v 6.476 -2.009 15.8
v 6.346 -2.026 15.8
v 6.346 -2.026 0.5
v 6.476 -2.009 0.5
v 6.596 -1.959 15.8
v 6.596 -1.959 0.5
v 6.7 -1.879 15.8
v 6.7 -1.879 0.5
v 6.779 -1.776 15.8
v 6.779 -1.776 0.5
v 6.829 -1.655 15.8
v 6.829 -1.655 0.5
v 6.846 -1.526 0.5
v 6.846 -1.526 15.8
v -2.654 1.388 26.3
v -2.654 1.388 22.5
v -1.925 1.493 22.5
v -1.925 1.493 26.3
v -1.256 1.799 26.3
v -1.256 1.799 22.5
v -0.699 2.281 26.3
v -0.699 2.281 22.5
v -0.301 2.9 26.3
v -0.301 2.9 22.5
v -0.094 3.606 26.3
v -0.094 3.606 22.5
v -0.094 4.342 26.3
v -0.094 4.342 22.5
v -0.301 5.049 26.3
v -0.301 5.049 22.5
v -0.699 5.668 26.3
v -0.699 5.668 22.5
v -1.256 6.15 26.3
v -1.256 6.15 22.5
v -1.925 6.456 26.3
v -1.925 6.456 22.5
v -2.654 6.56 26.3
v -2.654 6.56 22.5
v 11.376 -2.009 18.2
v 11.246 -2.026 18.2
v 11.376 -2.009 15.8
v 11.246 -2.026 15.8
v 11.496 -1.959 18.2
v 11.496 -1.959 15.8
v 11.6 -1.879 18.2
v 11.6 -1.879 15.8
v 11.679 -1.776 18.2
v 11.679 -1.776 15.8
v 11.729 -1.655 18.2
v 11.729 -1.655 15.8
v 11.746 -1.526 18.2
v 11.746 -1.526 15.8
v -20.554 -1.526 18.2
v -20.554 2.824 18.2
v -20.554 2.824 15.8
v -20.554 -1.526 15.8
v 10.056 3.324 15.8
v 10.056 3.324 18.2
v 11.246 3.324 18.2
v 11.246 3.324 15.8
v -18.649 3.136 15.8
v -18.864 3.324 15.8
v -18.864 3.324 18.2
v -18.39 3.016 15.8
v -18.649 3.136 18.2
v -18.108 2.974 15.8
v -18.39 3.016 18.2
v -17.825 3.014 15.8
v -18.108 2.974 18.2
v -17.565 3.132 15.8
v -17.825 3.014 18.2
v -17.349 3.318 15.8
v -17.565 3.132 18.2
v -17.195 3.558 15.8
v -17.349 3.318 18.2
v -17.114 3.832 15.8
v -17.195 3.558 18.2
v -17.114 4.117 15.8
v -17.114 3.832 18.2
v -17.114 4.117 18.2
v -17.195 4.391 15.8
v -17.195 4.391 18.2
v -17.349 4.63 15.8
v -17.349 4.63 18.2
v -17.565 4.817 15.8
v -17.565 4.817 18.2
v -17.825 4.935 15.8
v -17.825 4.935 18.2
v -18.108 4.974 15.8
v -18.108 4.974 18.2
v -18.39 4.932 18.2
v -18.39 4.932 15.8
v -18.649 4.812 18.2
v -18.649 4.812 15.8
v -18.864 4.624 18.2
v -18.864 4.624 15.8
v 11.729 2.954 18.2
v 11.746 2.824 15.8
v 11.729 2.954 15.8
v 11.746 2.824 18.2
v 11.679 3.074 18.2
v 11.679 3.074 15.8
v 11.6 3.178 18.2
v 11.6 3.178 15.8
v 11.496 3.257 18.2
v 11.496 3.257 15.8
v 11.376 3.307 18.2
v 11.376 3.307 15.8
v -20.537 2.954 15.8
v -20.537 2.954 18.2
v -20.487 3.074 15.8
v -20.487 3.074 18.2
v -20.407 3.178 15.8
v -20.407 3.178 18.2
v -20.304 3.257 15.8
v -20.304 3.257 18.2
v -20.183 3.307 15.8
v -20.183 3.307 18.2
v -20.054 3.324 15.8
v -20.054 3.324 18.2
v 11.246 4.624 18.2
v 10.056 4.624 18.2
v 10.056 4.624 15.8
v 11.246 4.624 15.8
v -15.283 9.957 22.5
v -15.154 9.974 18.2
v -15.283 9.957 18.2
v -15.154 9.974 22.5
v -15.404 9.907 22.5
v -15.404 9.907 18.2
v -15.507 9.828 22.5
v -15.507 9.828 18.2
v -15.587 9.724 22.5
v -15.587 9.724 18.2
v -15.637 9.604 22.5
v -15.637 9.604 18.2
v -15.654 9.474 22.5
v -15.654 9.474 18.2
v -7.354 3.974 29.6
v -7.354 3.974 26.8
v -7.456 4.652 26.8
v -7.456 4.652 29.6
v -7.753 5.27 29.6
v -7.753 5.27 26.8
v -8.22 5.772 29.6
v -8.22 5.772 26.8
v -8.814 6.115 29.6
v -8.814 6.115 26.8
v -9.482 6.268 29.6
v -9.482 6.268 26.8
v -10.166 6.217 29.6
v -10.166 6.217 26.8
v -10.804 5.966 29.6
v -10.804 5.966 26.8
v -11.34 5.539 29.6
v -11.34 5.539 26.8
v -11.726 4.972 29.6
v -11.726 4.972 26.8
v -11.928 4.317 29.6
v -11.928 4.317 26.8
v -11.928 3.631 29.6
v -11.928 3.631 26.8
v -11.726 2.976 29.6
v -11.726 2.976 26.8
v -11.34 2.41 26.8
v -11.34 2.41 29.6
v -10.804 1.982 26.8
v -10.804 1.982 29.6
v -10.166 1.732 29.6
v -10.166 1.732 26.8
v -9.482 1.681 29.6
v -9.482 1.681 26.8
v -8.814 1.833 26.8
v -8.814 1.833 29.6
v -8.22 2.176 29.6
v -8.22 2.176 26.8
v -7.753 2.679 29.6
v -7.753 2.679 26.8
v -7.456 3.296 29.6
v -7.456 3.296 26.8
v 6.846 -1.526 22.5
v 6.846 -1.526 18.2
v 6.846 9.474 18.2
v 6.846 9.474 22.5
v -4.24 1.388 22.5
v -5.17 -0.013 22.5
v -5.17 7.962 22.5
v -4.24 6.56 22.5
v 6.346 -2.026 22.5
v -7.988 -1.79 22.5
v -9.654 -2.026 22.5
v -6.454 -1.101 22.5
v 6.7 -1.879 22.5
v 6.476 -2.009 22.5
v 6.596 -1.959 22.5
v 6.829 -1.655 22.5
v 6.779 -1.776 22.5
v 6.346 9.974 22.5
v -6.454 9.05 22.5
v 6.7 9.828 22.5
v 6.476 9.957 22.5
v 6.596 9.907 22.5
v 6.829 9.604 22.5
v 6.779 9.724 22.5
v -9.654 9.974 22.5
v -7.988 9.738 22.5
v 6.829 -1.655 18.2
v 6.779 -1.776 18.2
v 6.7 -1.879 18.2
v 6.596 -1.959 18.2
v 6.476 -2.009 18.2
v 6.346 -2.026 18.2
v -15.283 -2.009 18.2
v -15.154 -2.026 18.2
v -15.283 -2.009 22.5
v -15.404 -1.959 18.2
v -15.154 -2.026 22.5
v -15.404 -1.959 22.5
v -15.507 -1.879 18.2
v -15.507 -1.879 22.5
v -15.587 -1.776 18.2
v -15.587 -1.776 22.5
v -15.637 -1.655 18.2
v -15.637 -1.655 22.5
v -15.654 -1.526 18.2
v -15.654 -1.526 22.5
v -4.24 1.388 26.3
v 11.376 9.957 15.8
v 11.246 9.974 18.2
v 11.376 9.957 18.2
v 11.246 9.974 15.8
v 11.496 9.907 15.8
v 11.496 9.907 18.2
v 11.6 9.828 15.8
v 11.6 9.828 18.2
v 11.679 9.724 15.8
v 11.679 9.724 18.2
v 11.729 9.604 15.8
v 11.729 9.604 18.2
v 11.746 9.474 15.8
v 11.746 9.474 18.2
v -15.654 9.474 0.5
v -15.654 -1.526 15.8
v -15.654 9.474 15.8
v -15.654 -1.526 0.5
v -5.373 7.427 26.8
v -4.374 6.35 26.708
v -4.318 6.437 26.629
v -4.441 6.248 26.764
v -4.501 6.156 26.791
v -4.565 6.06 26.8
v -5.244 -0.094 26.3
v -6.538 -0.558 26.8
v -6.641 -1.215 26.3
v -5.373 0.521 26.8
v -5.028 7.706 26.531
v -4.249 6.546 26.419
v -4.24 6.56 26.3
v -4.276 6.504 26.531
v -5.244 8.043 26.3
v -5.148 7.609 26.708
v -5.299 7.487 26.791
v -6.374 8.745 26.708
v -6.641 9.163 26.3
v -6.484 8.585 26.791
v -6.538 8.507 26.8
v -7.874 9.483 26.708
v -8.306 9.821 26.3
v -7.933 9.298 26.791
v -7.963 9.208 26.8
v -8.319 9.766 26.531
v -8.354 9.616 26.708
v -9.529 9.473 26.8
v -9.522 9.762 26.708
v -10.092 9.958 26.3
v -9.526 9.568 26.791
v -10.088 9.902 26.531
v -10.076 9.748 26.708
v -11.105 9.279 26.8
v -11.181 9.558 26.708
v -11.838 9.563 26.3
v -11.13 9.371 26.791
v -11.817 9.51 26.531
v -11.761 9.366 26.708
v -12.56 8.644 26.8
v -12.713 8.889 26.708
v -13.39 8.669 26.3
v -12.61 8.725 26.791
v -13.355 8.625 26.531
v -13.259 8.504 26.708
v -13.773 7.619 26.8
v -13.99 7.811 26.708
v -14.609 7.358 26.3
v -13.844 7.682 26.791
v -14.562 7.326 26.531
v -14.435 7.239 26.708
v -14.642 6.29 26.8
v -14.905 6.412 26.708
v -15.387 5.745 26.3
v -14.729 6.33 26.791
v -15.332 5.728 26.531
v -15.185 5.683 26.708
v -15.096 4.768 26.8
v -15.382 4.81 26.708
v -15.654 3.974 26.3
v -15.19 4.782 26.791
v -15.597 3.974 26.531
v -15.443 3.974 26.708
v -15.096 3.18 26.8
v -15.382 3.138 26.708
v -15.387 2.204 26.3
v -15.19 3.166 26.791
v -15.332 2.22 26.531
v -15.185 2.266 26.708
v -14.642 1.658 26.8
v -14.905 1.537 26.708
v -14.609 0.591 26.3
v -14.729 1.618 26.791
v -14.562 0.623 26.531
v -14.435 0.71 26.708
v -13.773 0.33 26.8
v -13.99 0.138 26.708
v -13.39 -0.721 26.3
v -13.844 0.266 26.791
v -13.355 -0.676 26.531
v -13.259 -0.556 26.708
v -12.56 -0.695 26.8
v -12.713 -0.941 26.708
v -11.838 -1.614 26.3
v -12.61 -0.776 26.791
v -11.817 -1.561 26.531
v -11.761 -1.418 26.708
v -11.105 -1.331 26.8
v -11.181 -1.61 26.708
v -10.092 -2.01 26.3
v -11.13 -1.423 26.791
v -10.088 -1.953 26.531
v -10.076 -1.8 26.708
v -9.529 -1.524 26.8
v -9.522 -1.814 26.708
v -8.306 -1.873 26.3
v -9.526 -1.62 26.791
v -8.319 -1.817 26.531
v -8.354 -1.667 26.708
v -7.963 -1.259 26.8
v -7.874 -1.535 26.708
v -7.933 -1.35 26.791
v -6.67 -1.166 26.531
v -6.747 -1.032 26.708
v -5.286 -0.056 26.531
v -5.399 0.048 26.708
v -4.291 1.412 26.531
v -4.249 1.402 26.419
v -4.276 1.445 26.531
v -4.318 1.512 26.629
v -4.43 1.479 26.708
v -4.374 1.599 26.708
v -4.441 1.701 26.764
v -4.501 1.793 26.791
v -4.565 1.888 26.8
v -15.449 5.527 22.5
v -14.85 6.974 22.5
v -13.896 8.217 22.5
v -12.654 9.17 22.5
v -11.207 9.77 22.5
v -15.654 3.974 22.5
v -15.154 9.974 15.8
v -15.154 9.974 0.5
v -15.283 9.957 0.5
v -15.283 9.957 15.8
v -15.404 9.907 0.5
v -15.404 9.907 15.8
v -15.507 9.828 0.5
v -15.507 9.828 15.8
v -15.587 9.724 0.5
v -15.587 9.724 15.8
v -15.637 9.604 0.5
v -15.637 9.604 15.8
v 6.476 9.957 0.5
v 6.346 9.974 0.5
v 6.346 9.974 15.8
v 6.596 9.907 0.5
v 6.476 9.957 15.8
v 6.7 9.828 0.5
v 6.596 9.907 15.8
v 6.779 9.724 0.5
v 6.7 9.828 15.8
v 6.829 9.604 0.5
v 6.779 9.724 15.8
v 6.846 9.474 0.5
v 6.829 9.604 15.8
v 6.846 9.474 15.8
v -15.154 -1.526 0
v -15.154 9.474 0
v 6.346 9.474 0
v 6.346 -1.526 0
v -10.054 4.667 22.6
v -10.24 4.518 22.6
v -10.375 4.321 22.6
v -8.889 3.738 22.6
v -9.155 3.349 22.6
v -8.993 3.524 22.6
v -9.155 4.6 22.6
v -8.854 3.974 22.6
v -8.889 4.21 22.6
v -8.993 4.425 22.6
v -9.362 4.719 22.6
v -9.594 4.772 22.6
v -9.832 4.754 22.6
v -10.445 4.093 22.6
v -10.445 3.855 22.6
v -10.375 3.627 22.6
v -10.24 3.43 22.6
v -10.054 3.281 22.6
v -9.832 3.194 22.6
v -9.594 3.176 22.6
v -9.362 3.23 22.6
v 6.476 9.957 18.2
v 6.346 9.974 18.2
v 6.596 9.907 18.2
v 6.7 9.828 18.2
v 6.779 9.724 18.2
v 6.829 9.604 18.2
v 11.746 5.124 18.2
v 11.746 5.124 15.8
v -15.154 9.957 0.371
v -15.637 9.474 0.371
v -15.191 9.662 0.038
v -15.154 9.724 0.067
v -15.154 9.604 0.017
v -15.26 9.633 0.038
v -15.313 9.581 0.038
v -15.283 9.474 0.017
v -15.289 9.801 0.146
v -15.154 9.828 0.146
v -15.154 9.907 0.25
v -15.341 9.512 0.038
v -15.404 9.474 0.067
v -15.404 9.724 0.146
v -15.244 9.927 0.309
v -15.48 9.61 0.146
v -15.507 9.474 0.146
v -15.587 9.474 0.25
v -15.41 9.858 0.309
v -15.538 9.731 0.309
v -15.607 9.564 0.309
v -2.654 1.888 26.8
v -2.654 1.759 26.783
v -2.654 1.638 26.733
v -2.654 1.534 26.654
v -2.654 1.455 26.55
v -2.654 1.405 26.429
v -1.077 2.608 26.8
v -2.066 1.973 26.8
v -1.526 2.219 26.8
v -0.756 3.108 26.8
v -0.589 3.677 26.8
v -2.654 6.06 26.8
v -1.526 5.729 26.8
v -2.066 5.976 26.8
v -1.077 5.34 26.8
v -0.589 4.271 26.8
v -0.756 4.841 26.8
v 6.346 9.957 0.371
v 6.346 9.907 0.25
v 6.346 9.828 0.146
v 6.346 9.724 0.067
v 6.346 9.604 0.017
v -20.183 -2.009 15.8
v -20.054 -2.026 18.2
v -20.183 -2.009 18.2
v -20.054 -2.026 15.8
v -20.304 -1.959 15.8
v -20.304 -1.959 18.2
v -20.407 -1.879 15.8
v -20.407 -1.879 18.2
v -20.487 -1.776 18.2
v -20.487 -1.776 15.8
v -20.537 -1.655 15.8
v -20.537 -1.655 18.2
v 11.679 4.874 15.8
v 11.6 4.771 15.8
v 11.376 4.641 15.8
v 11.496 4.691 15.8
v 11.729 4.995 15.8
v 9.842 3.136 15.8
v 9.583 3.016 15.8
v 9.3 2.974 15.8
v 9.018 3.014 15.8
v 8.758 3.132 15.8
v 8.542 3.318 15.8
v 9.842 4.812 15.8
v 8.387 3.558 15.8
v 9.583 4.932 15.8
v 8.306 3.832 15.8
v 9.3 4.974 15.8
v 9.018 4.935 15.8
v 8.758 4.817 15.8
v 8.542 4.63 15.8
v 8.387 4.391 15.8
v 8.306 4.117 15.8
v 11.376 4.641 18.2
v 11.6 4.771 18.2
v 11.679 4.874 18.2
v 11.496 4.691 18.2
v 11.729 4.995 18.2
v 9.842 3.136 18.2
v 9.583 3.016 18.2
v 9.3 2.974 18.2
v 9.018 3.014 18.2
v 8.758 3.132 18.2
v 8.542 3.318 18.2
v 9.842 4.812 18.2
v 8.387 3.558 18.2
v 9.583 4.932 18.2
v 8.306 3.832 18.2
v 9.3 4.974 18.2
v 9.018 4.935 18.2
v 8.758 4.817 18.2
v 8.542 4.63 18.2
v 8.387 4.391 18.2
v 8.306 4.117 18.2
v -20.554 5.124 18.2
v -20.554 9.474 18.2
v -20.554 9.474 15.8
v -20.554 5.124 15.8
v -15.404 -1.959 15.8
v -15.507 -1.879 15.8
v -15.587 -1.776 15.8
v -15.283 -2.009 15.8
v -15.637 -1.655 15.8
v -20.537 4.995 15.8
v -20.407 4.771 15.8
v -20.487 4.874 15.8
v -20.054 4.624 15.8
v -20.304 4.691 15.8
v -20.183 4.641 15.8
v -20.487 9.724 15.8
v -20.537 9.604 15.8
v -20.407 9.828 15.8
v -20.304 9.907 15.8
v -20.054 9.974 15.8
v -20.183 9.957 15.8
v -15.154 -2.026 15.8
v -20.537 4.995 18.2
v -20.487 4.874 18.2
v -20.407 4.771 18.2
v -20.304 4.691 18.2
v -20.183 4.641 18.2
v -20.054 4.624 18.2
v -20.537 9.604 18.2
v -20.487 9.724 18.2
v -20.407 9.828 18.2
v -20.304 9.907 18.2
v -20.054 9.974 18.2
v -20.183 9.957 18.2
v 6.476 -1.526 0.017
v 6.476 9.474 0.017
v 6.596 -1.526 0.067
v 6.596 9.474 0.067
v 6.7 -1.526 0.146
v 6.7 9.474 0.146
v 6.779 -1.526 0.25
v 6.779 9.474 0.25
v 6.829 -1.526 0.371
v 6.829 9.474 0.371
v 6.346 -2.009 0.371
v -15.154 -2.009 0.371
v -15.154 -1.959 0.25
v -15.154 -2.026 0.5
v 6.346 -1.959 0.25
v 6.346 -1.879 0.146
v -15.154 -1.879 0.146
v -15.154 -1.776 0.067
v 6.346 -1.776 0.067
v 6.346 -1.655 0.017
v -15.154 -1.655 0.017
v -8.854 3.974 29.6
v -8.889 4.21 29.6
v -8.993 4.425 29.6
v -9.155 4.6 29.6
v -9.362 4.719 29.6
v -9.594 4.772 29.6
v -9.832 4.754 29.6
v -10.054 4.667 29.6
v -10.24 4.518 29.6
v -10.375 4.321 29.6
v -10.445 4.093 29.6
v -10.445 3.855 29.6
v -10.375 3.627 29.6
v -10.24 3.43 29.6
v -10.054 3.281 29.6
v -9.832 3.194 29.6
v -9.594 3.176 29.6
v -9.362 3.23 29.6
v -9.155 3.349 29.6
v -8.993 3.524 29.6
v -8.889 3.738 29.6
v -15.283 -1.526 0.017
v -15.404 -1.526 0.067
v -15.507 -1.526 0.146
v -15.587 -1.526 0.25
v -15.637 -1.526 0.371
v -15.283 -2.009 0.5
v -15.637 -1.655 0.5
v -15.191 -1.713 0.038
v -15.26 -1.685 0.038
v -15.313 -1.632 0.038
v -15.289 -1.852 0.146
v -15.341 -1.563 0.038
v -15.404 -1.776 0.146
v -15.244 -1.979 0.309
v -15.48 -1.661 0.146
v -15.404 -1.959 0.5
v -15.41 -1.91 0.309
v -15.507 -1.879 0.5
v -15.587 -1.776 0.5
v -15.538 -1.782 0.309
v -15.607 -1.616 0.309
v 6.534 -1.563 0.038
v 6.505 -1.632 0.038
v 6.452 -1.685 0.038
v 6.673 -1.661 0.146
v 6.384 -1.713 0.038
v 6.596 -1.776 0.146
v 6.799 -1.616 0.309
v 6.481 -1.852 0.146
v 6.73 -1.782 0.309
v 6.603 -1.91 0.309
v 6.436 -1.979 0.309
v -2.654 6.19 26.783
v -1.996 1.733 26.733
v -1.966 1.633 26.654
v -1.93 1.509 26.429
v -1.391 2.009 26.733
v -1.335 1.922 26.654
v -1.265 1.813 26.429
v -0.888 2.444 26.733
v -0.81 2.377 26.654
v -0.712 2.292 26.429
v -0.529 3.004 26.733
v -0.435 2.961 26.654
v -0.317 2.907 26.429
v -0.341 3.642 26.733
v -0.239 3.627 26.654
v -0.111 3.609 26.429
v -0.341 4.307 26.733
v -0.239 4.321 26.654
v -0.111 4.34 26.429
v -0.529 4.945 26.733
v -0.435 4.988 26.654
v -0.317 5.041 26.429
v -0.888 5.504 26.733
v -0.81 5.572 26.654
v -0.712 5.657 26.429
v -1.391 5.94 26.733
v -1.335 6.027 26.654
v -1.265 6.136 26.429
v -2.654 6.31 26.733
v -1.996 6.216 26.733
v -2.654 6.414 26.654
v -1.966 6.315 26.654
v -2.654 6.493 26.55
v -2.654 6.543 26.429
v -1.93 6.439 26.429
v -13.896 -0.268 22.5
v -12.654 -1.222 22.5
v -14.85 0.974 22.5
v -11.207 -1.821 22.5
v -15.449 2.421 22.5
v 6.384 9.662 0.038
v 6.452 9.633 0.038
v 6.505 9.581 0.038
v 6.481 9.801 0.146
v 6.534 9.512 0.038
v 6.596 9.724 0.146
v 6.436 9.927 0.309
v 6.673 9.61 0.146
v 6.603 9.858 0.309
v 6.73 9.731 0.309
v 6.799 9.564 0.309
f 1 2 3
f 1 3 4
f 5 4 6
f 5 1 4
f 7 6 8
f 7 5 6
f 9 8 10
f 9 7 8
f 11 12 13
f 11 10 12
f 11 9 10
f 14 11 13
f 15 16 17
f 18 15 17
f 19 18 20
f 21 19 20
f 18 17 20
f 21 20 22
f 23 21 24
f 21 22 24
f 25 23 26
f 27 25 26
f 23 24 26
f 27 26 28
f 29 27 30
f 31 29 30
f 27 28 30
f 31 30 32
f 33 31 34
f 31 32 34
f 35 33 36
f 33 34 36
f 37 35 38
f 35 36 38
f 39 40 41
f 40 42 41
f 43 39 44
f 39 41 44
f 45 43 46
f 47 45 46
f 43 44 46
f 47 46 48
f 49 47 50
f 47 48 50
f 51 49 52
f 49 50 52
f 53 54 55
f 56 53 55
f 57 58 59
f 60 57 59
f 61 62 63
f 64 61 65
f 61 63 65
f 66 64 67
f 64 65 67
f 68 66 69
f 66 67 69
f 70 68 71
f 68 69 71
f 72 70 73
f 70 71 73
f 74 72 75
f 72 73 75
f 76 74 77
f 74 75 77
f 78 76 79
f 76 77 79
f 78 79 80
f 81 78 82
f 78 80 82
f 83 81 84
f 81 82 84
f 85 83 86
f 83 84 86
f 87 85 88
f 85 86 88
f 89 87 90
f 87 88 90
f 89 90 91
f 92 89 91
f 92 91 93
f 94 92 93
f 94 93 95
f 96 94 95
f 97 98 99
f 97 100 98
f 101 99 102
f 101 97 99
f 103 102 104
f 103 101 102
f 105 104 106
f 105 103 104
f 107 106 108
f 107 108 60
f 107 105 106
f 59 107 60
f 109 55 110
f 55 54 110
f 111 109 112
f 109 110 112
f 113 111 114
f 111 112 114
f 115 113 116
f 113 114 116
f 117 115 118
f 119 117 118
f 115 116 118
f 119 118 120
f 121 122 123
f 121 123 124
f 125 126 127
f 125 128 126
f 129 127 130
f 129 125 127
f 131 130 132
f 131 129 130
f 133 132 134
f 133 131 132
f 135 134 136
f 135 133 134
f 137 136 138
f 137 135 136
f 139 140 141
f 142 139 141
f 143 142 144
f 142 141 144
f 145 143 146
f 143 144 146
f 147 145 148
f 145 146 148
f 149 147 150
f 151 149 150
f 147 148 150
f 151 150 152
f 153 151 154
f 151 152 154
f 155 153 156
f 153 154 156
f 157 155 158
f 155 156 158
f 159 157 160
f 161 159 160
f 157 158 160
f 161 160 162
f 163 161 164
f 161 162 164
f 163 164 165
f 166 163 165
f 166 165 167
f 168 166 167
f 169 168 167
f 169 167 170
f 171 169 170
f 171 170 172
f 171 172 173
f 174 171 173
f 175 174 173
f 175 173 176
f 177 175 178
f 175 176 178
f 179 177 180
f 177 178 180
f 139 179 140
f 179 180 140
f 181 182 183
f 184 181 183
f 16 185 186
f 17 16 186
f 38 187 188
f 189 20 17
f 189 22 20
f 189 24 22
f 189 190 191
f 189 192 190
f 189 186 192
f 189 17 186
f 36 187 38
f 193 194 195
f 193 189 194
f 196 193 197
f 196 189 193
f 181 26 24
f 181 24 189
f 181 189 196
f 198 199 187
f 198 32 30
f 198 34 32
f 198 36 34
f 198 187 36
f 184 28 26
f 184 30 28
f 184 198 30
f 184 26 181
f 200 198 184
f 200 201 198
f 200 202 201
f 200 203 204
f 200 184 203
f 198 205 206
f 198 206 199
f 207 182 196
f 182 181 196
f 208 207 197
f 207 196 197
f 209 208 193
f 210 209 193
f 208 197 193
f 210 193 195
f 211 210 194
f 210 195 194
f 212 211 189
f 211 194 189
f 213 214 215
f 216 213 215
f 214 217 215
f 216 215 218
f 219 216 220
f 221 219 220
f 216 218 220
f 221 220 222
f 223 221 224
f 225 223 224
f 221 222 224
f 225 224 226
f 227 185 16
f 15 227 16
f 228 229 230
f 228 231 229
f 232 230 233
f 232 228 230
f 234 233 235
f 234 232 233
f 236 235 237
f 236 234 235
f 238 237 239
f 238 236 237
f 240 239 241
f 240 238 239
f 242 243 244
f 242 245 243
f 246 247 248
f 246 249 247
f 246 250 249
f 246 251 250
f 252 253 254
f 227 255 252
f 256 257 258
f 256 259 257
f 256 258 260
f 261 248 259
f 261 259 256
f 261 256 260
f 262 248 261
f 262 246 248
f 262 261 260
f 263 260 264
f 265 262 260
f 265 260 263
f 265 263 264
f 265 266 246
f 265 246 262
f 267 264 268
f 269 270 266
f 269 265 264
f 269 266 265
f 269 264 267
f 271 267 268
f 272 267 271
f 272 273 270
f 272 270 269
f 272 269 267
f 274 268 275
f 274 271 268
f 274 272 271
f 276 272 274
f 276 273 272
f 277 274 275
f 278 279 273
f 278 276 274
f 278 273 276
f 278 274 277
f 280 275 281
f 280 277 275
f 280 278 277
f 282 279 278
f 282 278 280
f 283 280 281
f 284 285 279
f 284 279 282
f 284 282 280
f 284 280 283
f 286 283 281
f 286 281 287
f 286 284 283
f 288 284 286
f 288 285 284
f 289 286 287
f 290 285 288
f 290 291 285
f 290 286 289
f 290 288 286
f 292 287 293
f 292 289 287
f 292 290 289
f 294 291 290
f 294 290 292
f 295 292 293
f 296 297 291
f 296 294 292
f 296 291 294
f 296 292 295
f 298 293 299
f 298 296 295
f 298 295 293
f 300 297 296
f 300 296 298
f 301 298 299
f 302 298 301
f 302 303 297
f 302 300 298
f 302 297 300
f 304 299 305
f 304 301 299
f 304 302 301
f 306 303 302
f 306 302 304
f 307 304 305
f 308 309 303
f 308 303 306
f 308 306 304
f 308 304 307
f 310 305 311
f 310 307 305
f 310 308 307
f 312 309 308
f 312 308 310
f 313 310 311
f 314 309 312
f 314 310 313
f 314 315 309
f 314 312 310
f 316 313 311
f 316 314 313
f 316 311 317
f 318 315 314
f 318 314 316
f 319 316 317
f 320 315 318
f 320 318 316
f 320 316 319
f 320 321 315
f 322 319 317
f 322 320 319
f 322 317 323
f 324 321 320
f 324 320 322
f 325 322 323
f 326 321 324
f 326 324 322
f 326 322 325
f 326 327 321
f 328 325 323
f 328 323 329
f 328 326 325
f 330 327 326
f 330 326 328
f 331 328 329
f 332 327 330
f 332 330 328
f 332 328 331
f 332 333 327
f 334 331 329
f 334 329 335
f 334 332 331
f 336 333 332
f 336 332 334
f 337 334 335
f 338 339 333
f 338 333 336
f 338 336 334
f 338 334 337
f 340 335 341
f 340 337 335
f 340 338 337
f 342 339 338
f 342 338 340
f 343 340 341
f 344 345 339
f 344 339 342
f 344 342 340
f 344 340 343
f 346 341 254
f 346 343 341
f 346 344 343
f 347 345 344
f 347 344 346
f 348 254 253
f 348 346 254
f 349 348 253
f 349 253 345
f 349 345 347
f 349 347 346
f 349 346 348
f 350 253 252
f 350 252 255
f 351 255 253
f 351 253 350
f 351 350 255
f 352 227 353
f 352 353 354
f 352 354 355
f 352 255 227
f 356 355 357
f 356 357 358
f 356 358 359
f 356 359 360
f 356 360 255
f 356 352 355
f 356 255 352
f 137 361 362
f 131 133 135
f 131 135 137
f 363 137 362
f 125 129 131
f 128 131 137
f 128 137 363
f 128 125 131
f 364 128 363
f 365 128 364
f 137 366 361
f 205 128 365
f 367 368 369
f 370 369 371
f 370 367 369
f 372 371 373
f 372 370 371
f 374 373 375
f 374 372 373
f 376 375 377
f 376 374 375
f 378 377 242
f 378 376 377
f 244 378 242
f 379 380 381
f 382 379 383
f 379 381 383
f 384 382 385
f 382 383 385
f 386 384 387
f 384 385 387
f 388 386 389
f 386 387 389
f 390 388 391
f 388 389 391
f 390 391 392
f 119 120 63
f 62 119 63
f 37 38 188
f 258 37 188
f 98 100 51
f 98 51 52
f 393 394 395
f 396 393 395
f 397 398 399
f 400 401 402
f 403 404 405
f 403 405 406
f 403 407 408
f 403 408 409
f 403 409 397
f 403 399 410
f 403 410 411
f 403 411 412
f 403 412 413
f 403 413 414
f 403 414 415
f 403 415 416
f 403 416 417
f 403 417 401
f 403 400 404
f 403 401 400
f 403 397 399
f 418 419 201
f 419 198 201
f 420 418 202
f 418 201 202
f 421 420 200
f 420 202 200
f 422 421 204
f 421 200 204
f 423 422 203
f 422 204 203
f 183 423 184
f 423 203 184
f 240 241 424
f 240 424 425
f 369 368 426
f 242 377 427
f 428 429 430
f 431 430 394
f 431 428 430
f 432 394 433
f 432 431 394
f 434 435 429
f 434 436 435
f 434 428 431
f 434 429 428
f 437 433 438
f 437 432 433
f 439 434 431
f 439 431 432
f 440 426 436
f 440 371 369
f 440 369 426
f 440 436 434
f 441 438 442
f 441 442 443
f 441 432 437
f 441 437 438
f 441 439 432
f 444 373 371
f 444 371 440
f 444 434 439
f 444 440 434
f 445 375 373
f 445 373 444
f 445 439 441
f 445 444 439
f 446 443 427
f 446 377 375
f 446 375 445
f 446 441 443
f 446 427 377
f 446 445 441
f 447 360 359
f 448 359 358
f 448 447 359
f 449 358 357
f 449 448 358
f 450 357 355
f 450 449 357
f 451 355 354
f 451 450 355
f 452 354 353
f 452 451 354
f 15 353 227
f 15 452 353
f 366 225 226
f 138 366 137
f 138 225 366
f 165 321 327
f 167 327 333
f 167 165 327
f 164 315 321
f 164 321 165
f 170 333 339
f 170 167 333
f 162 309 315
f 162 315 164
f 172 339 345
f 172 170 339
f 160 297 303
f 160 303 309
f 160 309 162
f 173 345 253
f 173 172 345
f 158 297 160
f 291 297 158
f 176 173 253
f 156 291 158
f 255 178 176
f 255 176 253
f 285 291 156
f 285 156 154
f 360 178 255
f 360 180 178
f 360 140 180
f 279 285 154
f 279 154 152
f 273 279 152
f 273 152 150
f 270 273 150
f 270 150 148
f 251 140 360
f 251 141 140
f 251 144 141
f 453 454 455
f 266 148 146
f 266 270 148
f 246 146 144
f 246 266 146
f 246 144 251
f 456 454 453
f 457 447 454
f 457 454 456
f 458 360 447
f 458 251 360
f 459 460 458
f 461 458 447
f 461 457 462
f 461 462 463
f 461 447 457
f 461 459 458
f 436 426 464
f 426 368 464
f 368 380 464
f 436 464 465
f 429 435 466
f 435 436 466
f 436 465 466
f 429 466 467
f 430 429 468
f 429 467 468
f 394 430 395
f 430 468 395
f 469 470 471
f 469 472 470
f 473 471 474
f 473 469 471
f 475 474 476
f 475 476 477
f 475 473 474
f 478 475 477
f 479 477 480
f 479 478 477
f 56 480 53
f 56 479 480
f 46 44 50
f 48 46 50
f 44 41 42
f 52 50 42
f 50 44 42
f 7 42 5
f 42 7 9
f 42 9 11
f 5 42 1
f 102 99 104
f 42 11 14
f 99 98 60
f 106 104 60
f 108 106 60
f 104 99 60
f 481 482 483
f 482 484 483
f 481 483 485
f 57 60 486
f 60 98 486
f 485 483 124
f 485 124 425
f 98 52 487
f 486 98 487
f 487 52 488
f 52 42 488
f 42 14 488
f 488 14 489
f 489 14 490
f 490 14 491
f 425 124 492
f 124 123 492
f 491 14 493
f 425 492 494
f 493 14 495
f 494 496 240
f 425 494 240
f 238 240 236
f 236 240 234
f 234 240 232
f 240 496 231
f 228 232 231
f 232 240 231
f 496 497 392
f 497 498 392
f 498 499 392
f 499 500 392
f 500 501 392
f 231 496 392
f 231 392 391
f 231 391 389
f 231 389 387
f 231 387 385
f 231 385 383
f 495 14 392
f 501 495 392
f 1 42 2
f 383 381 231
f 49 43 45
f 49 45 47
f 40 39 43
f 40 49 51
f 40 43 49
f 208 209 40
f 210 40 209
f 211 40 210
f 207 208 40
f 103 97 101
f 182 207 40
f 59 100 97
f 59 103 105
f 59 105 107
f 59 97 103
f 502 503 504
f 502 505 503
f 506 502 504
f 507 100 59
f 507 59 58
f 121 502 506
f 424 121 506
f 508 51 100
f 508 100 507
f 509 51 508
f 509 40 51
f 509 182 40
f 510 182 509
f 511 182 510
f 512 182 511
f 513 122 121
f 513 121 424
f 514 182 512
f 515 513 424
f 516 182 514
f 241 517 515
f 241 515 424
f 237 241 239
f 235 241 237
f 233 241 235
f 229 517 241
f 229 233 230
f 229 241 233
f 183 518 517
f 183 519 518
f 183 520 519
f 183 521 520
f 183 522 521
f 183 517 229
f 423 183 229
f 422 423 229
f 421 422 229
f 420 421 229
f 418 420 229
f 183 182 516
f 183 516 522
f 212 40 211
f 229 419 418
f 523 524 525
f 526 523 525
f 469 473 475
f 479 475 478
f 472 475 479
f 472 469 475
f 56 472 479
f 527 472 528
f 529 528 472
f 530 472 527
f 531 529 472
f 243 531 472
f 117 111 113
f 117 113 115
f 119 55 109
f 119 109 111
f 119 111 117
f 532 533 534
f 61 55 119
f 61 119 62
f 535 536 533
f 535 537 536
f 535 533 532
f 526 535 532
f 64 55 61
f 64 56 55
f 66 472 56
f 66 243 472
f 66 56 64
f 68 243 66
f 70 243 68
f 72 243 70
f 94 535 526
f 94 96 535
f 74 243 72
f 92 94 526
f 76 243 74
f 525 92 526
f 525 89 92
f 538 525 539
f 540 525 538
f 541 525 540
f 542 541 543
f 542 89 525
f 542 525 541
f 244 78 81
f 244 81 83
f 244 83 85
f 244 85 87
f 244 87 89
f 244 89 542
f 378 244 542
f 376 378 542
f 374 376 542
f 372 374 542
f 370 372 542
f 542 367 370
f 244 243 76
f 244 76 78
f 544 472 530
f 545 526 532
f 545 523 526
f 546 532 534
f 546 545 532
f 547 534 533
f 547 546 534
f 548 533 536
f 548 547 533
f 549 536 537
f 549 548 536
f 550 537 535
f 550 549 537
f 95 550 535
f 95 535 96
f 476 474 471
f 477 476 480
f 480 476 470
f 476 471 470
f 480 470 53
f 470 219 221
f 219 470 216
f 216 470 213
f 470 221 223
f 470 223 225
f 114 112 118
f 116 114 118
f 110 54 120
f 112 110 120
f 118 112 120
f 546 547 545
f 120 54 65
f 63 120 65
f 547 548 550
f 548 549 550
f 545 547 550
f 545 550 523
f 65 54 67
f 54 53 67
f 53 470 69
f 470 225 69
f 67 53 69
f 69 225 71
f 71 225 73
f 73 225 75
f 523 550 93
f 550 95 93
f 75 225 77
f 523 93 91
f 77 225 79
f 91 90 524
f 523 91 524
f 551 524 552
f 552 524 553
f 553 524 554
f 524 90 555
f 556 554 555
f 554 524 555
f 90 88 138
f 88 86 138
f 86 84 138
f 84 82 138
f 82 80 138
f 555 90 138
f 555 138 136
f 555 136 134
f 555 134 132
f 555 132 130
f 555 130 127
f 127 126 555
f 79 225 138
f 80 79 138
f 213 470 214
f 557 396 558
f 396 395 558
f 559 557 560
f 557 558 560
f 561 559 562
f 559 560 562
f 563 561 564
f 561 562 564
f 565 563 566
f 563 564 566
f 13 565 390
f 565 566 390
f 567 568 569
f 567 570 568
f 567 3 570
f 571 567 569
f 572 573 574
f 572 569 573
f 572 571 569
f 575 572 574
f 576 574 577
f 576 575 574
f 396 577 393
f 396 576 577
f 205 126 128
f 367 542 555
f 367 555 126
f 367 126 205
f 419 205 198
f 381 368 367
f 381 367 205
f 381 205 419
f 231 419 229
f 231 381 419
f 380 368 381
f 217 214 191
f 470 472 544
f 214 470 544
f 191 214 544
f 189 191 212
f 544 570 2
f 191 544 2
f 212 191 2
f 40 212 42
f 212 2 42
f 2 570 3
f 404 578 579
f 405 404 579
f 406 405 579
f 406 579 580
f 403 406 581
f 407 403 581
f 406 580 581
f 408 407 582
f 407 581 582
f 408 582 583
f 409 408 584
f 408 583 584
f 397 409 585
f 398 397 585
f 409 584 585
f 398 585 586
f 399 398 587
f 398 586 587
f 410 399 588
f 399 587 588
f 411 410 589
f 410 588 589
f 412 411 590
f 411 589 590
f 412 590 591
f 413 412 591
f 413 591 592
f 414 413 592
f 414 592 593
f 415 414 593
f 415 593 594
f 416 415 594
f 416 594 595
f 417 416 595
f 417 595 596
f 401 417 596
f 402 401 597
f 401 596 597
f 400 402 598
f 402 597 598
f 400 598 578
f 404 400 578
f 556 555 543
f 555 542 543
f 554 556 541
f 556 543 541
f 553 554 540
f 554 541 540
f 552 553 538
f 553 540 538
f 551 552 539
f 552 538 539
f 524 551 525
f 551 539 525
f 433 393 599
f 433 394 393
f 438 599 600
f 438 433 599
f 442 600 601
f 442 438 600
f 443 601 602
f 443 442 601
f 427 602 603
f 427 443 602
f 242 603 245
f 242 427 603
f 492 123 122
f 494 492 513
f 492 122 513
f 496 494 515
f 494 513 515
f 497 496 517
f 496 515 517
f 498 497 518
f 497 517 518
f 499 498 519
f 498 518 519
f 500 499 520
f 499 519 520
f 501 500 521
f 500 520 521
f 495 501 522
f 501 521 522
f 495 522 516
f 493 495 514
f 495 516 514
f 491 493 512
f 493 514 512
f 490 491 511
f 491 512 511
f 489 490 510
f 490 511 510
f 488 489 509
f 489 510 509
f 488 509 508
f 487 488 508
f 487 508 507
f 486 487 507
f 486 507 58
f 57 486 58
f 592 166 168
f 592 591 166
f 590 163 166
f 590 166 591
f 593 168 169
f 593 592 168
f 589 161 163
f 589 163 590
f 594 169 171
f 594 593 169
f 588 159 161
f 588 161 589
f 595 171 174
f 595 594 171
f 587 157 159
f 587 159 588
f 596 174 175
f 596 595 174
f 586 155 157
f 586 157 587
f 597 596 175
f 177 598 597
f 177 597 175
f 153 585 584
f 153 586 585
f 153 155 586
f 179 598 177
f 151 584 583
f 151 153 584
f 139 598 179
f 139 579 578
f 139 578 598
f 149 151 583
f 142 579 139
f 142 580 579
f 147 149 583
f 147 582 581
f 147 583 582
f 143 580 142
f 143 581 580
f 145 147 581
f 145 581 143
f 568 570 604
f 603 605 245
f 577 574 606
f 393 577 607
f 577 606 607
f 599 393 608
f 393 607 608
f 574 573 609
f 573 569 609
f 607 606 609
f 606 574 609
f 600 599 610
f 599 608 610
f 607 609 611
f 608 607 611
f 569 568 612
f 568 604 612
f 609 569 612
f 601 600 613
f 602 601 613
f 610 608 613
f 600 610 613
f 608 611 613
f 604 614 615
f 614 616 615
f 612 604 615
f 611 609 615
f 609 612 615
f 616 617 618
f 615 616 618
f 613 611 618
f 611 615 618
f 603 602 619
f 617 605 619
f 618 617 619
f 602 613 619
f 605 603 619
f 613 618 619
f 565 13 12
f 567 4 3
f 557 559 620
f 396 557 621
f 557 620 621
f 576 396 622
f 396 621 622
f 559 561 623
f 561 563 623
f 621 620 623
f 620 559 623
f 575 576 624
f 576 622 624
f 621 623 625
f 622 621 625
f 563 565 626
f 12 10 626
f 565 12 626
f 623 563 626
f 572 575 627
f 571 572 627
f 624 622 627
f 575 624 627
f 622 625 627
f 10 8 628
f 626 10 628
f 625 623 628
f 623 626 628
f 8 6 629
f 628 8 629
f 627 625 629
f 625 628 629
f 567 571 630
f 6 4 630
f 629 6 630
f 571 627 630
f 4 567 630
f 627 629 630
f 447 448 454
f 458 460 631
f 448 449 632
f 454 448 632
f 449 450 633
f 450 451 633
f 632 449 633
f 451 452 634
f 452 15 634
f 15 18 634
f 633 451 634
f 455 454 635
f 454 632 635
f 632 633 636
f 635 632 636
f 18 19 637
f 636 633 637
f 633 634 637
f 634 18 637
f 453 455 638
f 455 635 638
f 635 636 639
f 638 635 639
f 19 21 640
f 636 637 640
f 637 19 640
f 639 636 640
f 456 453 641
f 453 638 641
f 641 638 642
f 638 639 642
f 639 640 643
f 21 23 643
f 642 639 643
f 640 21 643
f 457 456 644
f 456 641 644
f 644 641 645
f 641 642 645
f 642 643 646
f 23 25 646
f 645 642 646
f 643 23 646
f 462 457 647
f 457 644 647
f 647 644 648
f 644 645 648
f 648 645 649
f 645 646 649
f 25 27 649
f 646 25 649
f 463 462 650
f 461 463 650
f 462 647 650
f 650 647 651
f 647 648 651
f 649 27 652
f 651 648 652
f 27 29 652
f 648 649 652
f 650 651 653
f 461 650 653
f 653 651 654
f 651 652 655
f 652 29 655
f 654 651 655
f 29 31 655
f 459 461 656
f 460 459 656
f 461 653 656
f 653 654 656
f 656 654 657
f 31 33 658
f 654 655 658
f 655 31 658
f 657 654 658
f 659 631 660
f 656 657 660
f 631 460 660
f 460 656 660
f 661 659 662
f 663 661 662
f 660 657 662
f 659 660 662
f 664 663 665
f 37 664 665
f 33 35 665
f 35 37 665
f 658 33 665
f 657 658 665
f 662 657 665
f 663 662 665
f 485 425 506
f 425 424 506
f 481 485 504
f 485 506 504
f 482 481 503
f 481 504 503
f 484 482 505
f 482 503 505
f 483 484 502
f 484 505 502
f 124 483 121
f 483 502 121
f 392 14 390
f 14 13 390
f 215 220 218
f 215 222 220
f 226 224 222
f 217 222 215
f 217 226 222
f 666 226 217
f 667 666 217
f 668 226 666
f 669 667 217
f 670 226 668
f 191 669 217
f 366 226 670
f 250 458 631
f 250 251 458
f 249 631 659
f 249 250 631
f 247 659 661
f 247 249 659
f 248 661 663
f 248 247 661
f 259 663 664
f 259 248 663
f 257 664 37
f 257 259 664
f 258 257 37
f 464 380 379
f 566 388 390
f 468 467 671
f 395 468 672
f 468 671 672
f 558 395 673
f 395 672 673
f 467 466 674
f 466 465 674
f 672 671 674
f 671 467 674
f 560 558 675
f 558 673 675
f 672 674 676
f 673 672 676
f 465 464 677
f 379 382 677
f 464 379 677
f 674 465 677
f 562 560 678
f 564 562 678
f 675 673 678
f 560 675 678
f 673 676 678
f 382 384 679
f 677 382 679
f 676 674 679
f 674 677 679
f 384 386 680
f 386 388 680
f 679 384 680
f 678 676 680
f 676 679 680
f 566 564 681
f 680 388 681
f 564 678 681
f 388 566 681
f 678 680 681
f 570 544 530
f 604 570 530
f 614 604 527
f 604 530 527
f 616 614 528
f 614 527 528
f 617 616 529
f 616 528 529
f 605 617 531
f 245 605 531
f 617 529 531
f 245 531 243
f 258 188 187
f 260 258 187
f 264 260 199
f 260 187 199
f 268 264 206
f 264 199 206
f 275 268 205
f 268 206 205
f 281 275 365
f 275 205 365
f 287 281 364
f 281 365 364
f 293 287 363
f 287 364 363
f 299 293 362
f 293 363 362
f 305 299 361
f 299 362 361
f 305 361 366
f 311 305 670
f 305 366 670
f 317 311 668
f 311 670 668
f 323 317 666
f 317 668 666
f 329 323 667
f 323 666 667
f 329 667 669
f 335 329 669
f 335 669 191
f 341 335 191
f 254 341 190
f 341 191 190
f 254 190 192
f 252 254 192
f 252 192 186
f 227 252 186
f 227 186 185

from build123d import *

# Parameters (mm, degrees)
SKETCH2_W                = 22.5
SKETCH2_H                = 12
BOSS_EXTRUDE1_DEPTH      = 22.5
SKETCH3_W                = 2.4
SKETCH3_H                = 12
BOSS_EXTRUDE2_DEPTH      = 4.9
BOSS_EXTRUDE2_DEPTH_BACK = 27.4
CUT_EXTRUDE1_REACH       = 20.2
SKETCH4_R                = 1
SKETCH5_R                = 6
BOSS_EXTRUDE3_DEPTH      = 4.3
SKETCH6_R                = 2.3
BOSS_EXTRUDE4_DEPTH      = 2.8
SKETCH7_R                = 0.8
CUT_EXTRUDE2_DEPTH       = 7
CUT_EXTRUDE3_REACH       = 20.2
SKETCH8_W                = 4.668208072
SKETCH8_H                = 1.3
SKETCH8_W_2              = 4.280898206
BOSS_EXTRUDE6_DEPTH      = 4.3
FILLET1_R                = 0.5


with BuildPart() as part:
    # Sketch2 → Boss-Extrude1 (new body)
    with BuildSketch(Plane.XY):
        with Locations((-4.403809909, 3.974212835)):
            Rectangle(SKETCH2_W, SKETCH2_H)
    extrude(amount=BOSS_EXTRUDE1_DEPTH)

    # Sketch3 → Boss-Extrude2 (add, two sides)
    with BuildSketch(Plane(origin=(6.846190091, 0, 0), x_dir=(0, 0, -1), z_dir=(1, 0, 0))) as boss_extrude2_sk:
        with Locations((-17, 3.974212835)):
            Rectangle(SKETCH3_W, SKETCH3_H)
    extrude(amount=BOSS_EXTRUDE2_DEPTH)
    extrude(boss_extrude2_sk.sketch, amount=-BOSS_EXTRUDE2_DEPTH_BACK)

    # Sketch4 → Cut-Extrude1 (cut, up to next)
    with BuildSketch(Plane.XY.offset(18.2), mode=Mode.PRIVATE) as cut_extrude1_sk1:
        with Locations((9.296190091, 3.974212835)):
            Circle(SKETCH4_R)
    cut_extrude1_tool1 = extrude(cut_extrude1_sk1.sketch, amount=-CUT_EXTRUDE1_REACH, mode=Mode.PRIVATE) & part.part
    add(cut_extrude1_tool1.solids().sort_by_distance((9.29619, 3.974213, 18.2))[0], mode=Mode.SUBTRACT)
    # Sketch4 → Cut-Extrude1 (cut, up to next)
    with BuildSketch(Plane.XY.offset(18.2), mode=Mode.PRIVATE) as cut_extrude1_sk2:
        with Locations((-18.103809909, 3.974212835)):
            Circle(SKETCH4_R)
    cut_extrude1_tool2 = extrude(cut_extrude1_sk2.sketch, amount=-CUT_EXTRUDE1_REACH, mode=Mode.PRIVATE) & part.part
    add(cut_extrude1_tool2.solids().sort_by_distance((-18.10381, 3.974213, 18.2))[0], mode=Mode.SUBTRACT)

    # Sketch5 → Boss-Extrude3 (add)
    with BuildSketch(Plane.XY.offset(22.5)):
        with Locations((-9.653809909, 3.974212835)):
            Circle(SKETCH5_R)
    extrude(amount=BOSS_EXTRUDE3_DEPTH)

    # Sketch6 → Boss-Extrude4 (add)
    with BuildSketch(Plane.XY.offset(26.8)):
        with Locations((-9.653809909, 3.974212835)):
            Circle(SKETCH6_R)
    extrude(amount=BOSS_EXTRUDE4_DEPTH)

    # Sketch7 → Cut-Extrude2 (cut)
    with BuildSketch(Plane.XY.offset(29.6)):
        with Locations((-9.653809909, 3.974212835)):
            Circle(SKETCH7_R)
    extrude(amount=-CUT_EXTRUDE2_DEPTH, mode=Mode.SUBTRACT)

    # Sketch8 → Cut-Extrude3 (cut, up to next)
    with BuildSketch(Plane.XY.offset(18.2), mode=Mode.PRIVATE) as cut_extrude3_sk1:
        with Locations((-20.553809909, 3.974212835)):
            Rectangle(SKETCH8_W, SKETCH8_H)
    cut_extrude3_tool1 = extrude(cut_extrude3_sk1.sketch, amount=-CUT_EXTRUDE3_REACH, mode=Mode.PRIVATE) & part.part
    add(cut_extrude3_tool1.solids().sort_by_distance((-20.55381, 3.974213, 18.2))[0], mode=Mode.SUBTRACT)
    # Sketch8 → Cut-Extrude3 (cut, up to next)
    with BuildSketch(Plane.XY.offset(18.2), mode=Mode.PRIVATE) as cut_extrude3_sk2:
        with Locations((11.746190091, 3.974212835)):
            Rectangle(SKETCH8_W_2, SKETCH8_H)
    cut_extrude3_tool2 = extrude(cut_extrude3_sk2.sketch, amount=-CUT_EXTRUDE3_REACH, mode=Mode.PRIVATE) & part.part
    add(cut_extrude3_tool2.solids().sort_by_distance((11.74619, 3.974213, 18.2))[0], mode=Mode.SUBTRACT)

    # Sketch9 → Boss-Extrude6 (add)
    with BuildSketch(Plane.XY.offset(22.5)):
        with BuildLine():
            Line((-2.653809909, 6.560409726), (-4.239792395, 6.560409726))
            Line((-4.239792395, 6.560409726), (-4.239792395, 1.388015944))
            Line((-4.239792395, 1.388015944), (-2.653809909, 1.388015944))
            ThreePointArc((-2.653809909, 1.388015944), (-0.067613018, 3.974212835), (-2.653809909, 6.560409726))
        make_face()
    extrude(amount=BOSS_EXTRUDE6_DEPTH)

    # Fillet1
    fillet1_edges = [part.edges().sort_by_distance(p)[0] for p in [
        (-15.653809909, 9.974212835, 7.9),
        (6.846190091, 9.974212835, 7.9),
        (6.846190091, -2.025787165, 7.9),
        (-15.653809909, -2.025787165, 7.9),
        (-20.553809909, 9.974212835, 17),
        (-20.553809909, -2.025787165, 17),
        (11.746190091, -2.025787165, 17),
        (11.746190091, 9.974212835, 17),
        (-4.403809909, 9.974212835, 0),
        (6.846190091, 3.974212835, 0),
        (-15.653809909, 3.974212835, 26.8),
        (-4.403809909, -2.025787165, 0),
        (-15.653809909, 3.974212835, 0),
        (-20.553809909, 3.324212835, 17),
        (-20.553809909, 4.624212835, 17),
        (-15.653809909, 9.974212835, 20.35),
        (6.846190091, 9.974212835, 20.35),
        (6.846190091, -2.025787165, 20.35),
        (-15.653809909, -2.025787165, 20.35),
        (11.746190091, 3.324212835, 17),
        (11.746190091, 4.624212835, 17),
        (-3.446801152, 1.388015944, 26.8),
        (-0.067613018, 3.974212835, 26.8),
        (-3.446801152, 6.560409726, 26.8),
    ]]
    fillet(fillet1_edges, radius=FILLET1_R)


solid = part.part
